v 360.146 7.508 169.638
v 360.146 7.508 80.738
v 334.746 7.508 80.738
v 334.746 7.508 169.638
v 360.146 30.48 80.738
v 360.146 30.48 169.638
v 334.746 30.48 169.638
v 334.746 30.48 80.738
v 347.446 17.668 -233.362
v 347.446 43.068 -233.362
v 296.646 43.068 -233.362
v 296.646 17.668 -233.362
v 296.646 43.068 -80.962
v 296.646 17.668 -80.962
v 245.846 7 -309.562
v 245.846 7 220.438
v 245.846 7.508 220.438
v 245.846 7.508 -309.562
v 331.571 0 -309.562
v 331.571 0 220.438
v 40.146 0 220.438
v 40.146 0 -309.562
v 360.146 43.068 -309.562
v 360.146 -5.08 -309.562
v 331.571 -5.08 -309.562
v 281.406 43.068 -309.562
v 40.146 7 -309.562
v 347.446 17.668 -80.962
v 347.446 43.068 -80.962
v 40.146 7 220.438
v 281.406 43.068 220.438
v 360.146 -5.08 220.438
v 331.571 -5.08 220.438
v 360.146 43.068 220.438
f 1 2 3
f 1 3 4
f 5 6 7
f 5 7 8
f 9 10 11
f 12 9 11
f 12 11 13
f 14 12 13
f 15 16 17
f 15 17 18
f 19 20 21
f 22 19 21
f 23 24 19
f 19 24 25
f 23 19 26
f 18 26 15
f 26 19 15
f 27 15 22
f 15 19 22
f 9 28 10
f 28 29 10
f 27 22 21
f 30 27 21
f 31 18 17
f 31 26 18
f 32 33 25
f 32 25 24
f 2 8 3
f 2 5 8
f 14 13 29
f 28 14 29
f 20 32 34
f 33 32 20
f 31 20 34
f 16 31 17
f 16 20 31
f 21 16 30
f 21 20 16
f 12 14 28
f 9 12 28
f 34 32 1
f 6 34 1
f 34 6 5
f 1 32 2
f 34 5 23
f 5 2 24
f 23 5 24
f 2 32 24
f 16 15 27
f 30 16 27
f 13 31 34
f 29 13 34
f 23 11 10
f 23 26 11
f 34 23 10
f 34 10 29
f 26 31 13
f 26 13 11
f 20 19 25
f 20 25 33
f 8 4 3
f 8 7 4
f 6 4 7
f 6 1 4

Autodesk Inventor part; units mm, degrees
ref_plane "YZ Plane" through (0, 0, 0) normal (1, 0, 0) x (0, 1, 0)
ref_plane "XZ Plane" through (0, 0, 0) normal (0, 1, 0) x (-1, 0, 0)
ref_plane "XY Plane" through (0, 0, 0) normal (0, 0, 1) x (1, 0, 0)
sketch "Sketch1" plane through (0, 0, 0) normal (0, 1, 0) x (-1, 0, 0)
  line L0 (-40.1461, 220.4385) -> (-360.1461, 220.4385)
  line L1 (-360.1461, 220.4385) -> (-360.1461, -309.5615)
  line L2 (-360.1461, -309.5615) -> (-40.1461, -309.5615)
  line L3 (-40.1461, -309.5615) -> (-40.1461, 220.4385)
  point P0 (0, 0)
  dimension "d0" = 530
  dimension "d1" = 320
extrude "Extrusion1" add sketch "Sketch1" along normal blind 7
sketch "Sketch7" plane through (0, 0, 0) normal (0, -1, 0) x (1, 0, 0)
  line L0 (360.1461, 220.4385) -> (360.1461, -309.5615) projected
  line L1 (40.1461, 220.4385) -> (360.1461, 220.4385) projected
  line L2 (360.1461, -309.5615) -> (331.5711, -309.5615)
  line L3 (331.5711, -309.5615) -> (331.5711, 220.4385)
  line L4 (331.5711, 220.4385) -> (360.1461, 220.4385)
  line L5 (360.1461, 220.4385) -> (360.1461, -309.5615)
  point P0 (0, 0)
  dimension "d15" = 28.575
extrude "Extrusion5" add sketch "Sketch7" along normal blind 5.08
sketch "Sketch8" plane through (0, 7, 0) normal (0, 1, 0) x (1, 0, 0)
  line L0 (360.1461, -220.4385) -> (360.1461, 309.5615) projected
  line L1 (360.1461, 309.5615) -> (40.1461, 309.5615) projected
  line L2 (360.1461, -220.4385) -> (283.9461, -220.4385)
  line L3 (283.9461, -220.4385) -> (283.9461, 309.5615)
  line L4 (283.9461, 309.5615) -> (360.1461, 309.5615)
  line L5 (360.1461, 309.5615) -> (360.1461, -220.4385)
  point P0 (0, 0)
  dimension "d18" = 76.2
extrude "Extrusion6" add sketch "Sketch8" along normal blind 36.068
sketch "Sketch9" plane through (0, 7, 0) normal (0, 1, 0) x (1, 0, 0)
  line L0 (283.9461, 309.5615) -> (283.9461, -220.4385) projected
  line L1 (283.9461, 309.5615) -> (40.1461, 309.5615) projected
  line L2 (283.9461, -220.4385) -> (245.8461, -220.4385)
  line L3 (245.8461, -220.4385) -> (245.8461, 309.5615)
  line L4 (245.8461, 309.5615) -> (283.9461, 309.5615)
  line L5 (283.9461, 309.5615) -> (283.9461, -220.4385)
  point P0 (0, 0)
  dimension "d21" = 38.1
extrude "Extrusion7" add sketch "Sketch9" along normal blind 36.068
chamfer "Chamfer1" distance 35.56 angle 45 1 edges at (245.8461, 43.068, -44.5615) measured on face at (245.8461, 19.0227, -132.8949)
sketch "Sketch10" plane through (0, 43.068, 0) normal (0, 1, 0) x (1, 0, 0)
  line L0 (296.6461, 80.9615) -> (347.4461, 80.9615)
  line L1 (347.4461, 80.9615) -> (347.4461, 233.3615)
  line L2 (347.4461, 233.3615) -> (296.6461, 233.3615)
  line L3 (296.6461, 233.3615) -> (296.6461, 80.9615)
  line L4 (360.1461, 309.5615) -> (281.4061, 309.5615) projected
  line L5 (360.1461, -220.4385) -> (360.1461, 309.5615) projected
  point P0 (0, 0)
  dimension "d27" = 76.2
  dimension "d28" = 228.6
  dimension "d29" = 12.7
  dimension "d30" = 63.5
extrude "Extrusion8" cut sketch "Sketch10" against normal blind 25.4
sketch "Sketch11" plane through (360.1461, -5.08, 220.4385) normal (1, 0, 0) x (0, 0, -1)
  line L0 (530, 12.588) -> (0, 12.588) projected
  line L1 (50.8, 35.56) -> (139.7, 35.56)
  line L2 (139.7, 35.56) -> (139.7, 12.588)
  line L3 (139.7, 12.588) -> (50.8, 12.588)
  line L4 (50.8, 12.588) -> (50.8, 35.56)
  line L5 (0, 48.148) -> (0, 0) projected
  line L6 (530, 0) -> (0, 0) projected
  line L7 (0, 48.148) -> (530, 48.148) projected
  point P0 (220.4385, 5.08)
  dimension "d33" = 50.8
  dimension "d34" = 139.7
  dimension "d35" = 12.588
  dimension "d36" = 12.588
extrude "Extrusion9" cut sketch "Sketch11" against normal blind 25.4
ref_plane "Work Plane2" through (185.8586, 0, -309.5615) normal (-1, 0, 0) x (0, 0, 1)
equation "\"d36\" = d35"
properties part number "Mock Acer SB230"
